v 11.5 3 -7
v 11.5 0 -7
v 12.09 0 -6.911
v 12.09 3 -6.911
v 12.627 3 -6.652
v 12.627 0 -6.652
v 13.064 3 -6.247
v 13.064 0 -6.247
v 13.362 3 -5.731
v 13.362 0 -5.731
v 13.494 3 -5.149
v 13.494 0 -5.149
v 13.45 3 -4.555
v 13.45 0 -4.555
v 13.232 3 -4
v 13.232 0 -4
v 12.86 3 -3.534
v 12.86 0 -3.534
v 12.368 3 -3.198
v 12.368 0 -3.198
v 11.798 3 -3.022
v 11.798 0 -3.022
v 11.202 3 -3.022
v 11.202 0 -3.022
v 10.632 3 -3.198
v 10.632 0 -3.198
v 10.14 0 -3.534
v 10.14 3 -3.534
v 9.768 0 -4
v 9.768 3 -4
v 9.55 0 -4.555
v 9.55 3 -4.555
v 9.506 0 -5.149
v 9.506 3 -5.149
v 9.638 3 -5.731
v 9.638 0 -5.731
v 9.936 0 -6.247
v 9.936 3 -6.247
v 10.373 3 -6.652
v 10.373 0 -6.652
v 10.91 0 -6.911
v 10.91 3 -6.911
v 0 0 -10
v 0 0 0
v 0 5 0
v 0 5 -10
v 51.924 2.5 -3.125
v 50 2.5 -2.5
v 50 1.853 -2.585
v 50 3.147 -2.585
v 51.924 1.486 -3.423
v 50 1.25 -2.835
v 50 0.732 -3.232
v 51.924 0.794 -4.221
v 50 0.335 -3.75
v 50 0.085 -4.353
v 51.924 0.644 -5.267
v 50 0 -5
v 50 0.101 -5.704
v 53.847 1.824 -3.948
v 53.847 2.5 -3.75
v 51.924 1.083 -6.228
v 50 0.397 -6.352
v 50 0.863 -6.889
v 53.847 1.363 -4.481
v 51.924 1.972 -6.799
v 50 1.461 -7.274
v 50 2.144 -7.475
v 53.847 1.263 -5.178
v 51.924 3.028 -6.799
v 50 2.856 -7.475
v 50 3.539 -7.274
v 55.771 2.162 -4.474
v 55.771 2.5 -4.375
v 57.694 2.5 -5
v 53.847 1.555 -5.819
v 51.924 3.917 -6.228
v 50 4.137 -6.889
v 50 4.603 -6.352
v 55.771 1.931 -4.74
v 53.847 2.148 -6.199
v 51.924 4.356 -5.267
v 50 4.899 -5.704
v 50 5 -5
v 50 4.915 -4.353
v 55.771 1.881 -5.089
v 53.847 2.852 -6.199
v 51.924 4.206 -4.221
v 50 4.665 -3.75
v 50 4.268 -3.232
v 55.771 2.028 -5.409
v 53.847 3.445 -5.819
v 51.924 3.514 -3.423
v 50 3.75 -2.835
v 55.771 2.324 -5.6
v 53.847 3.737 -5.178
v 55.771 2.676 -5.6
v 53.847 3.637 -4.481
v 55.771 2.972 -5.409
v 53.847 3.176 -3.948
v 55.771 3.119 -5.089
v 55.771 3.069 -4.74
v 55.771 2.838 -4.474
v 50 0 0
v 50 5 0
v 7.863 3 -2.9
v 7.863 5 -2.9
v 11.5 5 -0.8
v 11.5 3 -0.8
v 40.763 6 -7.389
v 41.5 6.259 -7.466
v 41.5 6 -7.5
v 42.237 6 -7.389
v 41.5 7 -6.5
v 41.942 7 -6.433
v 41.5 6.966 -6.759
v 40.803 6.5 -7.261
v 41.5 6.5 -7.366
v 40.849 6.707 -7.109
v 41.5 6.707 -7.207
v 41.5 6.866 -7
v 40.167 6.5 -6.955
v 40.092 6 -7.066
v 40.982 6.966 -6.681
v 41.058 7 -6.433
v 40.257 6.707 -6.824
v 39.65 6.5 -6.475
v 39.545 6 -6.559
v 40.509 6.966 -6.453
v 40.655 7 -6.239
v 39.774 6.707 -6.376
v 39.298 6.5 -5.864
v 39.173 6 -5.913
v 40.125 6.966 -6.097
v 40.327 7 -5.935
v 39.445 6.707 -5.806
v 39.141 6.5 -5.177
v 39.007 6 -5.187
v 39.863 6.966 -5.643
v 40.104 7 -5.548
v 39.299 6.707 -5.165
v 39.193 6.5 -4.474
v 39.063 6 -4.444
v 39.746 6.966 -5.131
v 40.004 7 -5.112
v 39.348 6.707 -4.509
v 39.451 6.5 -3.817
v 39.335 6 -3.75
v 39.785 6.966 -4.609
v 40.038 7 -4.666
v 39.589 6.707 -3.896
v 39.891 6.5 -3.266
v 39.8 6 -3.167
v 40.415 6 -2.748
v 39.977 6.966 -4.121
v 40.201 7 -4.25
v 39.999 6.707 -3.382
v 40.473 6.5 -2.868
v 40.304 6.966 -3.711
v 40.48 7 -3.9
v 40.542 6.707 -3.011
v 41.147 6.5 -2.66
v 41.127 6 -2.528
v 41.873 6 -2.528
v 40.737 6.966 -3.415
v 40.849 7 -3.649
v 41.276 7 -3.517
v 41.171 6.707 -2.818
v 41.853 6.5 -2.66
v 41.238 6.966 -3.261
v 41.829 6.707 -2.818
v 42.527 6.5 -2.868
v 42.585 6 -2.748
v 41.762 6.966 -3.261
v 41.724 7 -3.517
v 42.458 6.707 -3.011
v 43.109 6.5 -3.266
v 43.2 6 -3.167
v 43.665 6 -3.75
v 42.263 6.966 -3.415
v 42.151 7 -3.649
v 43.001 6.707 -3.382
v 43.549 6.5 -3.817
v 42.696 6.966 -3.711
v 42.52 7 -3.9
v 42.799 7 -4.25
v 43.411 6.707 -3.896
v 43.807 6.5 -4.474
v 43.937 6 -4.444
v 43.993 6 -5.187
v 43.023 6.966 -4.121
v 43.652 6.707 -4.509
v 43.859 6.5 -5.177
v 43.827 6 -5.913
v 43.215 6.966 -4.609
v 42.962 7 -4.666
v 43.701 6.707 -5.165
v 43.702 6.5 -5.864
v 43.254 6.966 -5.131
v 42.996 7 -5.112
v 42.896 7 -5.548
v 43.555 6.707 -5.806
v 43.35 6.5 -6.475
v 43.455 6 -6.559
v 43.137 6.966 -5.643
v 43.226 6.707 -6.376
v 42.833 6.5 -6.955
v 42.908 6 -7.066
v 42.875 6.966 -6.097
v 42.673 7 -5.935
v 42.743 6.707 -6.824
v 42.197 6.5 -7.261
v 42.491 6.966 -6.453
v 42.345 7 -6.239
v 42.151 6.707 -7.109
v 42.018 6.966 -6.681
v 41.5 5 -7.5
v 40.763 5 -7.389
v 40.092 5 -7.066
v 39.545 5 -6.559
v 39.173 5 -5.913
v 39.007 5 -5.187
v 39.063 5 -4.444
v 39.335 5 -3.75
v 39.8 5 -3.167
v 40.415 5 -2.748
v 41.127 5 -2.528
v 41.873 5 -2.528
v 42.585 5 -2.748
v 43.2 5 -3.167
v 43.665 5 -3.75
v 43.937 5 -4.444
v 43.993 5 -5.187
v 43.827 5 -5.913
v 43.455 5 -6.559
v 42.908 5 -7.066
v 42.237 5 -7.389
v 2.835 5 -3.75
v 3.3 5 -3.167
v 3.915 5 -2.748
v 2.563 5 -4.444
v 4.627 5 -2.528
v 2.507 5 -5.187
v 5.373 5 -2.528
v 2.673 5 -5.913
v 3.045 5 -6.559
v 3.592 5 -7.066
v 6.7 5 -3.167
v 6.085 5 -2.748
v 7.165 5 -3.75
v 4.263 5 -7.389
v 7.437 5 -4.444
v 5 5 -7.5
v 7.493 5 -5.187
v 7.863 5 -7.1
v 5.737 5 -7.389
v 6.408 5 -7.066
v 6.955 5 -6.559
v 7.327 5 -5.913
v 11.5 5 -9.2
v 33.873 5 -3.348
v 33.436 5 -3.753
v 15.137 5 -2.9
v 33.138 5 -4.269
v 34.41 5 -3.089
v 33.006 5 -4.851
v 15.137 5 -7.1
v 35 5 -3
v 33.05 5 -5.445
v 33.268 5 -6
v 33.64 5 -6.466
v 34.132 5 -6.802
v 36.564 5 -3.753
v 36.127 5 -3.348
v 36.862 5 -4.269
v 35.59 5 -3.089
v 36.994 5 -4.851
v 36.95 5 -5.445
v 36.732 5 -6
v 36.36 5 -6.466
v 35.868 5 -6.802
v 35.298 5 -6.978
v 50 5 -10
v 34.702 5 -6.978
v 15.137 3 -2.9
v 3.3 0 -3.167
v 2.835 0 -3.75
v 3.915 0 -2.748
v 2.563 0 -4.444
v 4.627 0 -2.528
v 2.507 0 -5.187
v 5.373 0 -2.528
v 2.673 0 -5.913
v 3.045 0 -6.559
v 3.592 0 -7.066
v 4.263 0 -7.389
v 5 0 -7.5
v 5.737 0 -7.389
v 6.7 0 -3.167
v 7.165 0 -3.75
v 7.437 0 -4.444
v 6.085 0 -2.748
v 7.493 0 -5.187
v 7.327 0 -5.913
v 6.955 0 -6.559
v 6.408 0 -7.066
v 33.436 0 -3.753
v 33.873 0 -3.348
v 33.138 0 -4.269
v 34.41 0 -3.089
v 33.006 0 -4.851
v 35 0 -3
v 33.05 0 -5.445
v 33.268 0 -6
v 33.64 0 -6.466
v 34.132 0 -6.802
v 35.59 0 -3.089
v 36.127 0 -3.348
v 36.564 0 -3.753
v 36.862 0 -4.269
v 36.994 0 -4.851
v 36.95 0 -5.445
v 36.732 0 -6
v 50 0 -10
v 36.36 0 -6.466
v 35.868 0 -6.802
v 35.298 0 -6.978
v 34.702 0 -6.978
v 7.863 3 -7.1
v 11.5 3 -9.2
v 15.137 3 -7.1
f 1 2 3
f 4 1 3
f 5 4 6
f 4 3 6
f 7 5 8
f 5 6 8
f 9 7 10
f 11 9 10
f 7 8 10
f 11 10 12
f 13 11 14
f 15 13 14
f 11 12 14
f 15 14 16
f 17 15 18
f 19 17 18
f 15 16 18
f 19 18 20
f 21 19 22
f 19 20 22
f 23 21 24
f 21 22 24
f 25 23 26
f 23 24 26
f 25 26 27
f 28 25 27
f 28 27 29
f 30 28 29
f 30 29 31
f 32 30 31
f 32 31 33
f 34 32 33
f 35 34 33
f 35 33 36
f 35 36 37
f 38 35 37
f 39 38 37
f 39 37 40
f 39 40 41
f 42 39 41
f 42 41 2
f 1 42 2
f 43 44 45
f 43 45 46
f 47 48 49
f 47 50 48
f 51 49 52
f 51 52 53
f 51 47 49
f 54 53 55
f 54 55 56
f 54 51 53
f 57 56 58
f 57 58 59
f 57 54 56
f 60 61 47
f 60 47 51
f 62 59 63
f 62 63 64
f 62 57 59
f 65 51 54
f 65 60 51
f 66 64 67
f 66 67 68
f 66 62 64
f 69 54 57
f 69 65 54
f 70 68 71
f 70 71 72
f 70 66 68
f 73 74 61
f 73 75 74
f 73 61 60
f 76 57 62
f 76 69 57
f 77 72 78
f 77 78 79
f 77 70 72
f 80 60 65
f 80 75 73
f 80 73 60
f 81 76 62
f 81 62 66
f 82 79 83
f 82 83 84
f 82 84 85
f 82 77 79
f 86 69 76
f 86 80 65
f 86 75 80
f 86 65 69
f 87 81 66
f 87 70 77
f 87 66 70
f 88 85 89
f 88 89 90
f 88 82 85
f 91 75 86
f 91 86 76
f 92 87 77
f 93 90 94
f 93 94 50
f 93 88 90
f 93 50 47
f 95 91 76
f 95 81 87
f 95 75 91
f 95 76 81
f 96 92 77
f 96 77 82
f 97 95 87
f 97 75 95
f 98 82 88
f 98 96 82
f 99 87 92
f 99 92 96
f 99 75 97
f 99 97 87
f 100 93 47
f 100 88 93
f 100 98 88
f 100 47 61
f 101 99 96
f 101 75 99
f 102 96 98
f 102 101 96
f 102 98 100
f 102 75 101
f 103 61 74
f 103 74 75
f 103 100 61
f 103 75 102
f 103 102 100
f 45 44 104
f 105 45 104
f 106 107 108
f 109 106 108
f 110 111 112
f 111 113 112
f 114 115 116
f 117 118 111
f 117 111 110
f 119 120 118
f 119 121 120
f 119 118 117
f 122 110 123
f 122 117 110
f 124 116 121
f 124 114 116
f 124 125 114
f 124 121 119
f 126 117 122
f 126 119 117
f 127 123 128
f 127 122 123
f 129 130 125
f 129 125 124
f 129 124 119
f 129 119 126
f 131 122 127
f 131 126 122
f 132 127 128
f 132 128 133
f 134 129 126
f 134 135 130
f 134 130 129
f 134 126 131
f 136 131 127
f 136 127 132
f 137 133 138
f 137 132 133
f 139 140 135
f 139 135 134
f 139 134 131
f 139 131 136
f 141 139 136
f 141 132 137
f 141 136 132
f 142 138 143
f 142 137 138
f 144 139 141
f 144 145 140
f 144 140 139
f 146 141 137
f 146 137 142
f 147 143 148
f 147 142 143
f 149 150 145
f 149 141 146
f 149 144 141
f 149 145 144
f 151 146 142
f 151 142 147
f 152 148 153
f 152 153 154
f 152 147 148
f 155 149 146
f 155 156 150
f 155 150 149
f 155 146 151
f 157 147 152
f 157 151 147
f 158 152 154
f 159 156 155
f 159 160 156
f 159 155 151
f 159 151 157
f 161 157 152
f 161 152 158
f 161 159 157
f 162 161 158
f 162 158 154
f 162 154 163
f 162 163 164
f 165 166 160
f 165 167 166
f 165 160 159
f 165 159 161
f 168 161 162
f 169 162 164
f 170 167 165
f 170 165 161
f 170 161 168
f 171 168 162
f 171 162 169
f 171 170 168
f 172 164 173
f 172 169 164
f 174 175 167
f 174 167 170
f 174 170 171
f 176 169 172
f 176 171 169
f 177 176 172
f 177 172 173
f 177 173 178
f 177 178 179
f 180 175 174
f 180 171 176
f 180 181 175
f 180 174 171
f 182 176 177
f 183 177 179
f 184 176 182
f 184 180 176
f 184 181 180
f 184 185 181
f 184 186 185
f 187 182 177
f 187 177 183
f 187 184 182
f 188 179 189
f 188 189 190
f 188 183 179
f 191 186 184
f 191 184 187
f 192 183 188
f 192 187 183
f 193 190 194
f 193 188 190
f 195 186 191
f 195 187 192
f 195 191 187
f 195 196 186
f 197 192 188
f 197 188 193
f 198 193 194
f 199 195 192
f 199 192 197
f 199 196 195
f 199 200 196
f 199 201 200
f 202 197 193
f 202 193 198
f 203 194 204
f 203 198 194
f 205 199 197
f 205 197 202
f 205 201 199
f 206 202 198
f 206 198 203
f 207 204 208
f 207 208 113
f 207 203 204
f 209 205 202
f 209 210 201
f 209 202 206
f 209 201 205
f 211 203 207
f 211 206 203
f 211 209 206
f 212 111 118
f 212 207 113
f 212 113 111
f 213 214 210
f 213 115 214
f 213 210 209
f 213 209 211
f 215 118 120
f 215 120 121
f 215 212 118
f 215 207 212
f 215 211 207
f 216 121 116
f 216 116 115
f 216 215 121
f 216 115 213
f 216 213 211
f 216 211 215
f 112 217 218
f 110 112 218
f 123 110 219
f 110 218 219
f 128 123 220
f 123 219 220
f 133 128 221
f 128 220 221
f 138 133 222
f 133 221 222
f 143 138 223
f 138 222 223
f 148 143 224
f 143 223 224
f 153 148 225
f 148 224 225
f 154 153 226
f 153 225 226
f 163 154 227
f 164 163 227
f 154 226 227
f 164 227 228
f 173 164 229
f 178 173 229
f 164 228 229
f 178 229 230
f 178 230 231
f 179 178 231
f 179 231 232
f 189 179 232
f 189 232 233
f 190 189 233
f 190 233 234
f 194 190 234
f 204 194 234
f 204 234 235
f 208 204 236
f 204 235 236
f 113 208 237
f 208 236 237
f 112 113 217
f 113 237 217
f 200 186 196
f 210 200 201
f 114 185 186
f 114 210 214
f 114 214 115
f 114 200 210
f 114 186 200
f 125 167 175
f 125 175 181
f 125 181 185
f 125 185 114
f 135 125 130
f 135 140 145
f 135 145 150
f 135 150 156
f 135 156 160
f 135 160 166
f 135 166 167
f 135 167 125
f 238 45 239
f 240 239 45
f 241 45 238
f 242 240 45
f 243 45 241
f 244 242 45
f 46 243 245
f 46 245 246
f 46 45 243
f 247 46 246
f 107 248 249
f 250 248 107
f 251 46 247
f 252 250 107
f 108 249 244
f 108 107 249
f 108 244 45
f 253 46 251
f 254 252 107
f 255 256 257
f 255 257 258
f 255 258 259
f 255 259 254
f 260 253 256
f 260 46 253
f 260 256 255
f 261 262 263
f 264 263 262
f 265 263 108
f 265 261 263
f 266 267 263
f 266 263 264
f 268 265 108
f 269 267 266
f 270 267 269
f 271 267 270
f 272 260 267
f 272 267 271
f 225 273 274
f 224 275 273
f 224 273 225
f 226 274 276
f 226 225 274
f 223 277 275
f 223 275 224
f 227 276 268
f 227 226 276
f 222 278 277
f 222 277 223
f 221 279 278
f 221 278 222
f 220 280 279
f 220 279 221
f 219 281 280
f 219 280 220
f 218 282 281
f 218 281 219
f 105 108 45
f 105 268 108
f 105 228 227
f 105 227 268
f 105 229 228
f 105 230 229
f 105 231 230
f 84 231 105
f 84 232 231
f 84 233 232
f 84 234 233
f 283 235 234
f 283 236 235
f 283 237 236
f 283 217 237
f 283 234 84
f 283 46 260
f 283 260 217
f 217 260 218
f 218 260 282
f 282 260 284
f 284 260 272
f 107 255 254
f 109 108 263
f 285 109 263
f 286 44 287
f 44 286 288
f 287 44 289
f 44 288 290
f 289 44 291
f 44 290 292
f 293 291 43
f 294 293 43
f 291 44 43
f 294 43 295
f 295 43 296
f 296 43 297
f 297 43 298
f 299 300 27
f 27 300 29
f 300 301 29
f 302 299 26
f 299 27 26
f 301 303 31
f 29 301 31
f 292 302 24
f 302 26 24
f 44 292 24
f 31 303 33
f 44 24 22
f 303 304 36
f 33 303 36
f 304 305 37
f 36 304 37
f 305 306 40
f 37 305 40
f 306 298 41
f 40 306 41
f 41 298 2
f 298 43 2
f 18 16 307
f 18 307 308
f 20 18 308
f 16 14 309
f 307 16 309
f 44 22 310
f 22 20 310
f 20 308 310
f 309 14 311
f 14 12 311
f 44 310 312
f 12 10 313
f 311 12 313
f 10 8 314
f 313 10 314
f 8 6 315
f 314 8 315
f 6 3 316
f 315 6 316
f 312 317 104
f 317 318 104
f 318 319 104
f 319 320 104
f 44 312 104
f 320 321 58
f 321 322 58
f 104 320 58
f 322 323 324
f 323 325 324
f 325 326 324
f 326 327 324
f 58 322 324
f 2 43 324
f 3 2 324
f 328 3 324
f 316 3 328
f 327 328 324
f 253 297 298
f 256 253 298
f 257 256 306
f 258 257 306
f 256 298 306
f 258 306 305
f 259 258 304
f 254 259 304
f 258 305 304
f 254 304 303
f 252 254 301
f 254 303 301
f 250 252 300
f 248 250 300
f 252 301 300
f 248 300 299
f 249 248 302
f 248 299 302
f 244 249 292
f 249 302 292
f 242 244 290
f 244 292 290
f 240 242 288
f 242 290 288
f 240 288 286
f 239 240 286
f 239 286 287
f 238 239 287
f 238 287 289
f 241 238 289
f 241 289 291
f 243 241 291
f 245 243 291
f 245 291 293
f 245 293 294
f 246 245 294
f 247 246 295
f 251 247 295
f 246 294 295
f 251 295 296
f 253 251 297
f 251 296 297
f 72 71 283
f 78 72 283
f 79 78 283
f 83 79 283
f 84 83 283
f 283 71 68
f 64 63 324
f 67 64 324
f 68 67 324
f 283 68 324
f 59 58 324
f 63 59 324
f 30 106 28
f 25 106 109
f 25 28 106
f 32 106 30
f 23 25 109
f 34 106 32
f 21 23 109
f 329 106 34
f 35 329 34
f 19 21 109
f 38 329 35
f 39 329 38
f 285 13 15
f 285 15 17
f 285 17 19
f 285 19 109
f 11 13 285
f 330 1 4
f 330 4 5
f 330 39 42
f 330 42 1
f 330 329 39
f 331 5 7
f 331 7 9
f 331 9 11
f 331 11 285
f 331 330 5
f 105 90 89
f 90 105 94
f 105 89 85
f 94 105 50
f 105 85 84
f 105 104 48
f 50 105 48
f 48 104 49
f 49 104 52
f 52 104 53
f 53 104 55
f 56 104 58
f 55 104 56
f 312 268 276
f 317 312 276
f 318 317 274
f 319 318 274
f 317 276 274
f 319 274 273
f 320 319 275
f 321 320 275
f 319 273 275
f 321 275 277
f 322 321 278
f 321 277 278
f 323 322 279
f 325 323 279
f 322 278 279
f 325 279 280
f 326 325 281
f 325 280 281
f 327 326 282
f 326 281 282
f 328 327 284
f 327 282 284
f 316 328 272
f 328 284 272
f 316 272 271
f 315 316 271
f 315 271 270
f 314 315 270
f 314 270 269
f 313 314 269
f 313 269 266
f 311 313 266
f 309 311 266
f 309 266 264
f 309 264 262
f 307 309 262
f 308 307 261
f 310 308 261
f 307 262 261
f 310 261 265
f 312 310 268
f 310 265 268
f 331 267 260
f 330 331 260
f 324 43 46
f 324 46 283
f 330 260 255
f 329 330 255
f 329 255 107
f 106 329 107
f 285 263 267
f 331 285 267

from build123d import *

# Parameters (mm, degrees)
SKETCH1_W           = 50
SKETCH1_H           = 10
BOSS_EXTRUDE1_DEPTH = 5
SKETCH2_R           = 2.5
SKETCH2_R_2         = 2
CUT_EXTRUDE1_DEPTH  = 5
SKETCH3_R           = 2
CUT_EXTRUDE2_DEPTH  = 5
CUT_EXTRUDE3_DEPTH  = 2
SKETCH5_R           = 2.5
BOSS_EXTRUDE2_DEPTH = 2
FILLET1_R           = 1


with BuildPart() as part:
    # Sketch1 → Boss-Extrude1 (new body)
    with BuildSketch(Plane(origin=(0, 0, 0), x_dir=(1, 0, 0), z_dir=(0, 1, 0))):
        with Locations((25, 5)):
            Rectangle(SKETCH1_W, SKETCH1_H)
    extrude(amount=BOSS_EXTRUDE1_DEPTH)

    # Sketch2 → Cut-Extrude1 (cut)
    with BuildSketch(Plane.XZ):
        with Locations(Location((5, -5, 0), (0, 0, 270))):
            Circle(SKETCH2_R)
        with Locations(Location((11.5, -5, 0), (0, 0, 270))):
            Circle(SKETCH2_R_2)
    extrude(amount=-CUT_EXTRUDE1_DEPTH, mode=Mode.SUBTRACT)

    # Sketch3 → Cut-Extrude2 (cut)
    with BuildSketch(Plane(origin=(0, 5, 0), x_dir=(1, 0, 0), z_dir=(0, 1, 0))):
        with Locations(Location((35, 5, 0), (0, 0, 270))):
            Circle(SKETCH3_R)
    extrude(amount=-CUT_EXTRUDE2_DEPTH, mode=Mode.SUBTRACT)

    # Sketch4 → Cut-Extrude3 (cut)
    with BuildSketch(Plane(origin=(0, 5, 0), x_dir=(1, 0, 0), z_dir=(0, 1, 0))):
        Polygon((11.5, 0.8), (15.137306696, 2.9), (15.137306696, 7.1), (11.5, 9.2), (7.862693304, 7.1), (7.862693304, 2.9), align=None)
    extrude(amount=-CUT_EXTRUDE3_DEPTH, mode=Mode.SUBTRACT)

    # Sketch5 → Boss-Extrude2 (add)
    with BuildSketch(Plane(origin=(0, 5, 0), x_dir=(1, 0, 0), z_dir=(0, 1, 0))):
        with Locations(Location((41.5, 5, 0), (0, 0, 90))):
            Circle(SKETCH5_R)
    extrude(amount=BOSS_EXTRUDE2_DEPTH)

    # Fillet1
    fillet1_edges = [part.edges().sort_by_distance(p)[0] for p in [
        (41.5, 7, -2.5),
    ]]
    fillet(fillet1_edges, radius=FILLET1_R)

    # Boss-Extrude3 cone 1 section (through the dimple's axis) → Boss-Extrude3 (revolve)
    with BuildSketch(Plane(origin=(50, 2.5, -5), x_dir=(0, 0, 1), z_dir=(0, 1, 0))):
        Polygon((0, 0), (2.5, 0), (0, 7.694208843), align=None)
    revolve(axis=Axis((50, 2.5, -5), (1, 0, 0)))


solid = part.part
